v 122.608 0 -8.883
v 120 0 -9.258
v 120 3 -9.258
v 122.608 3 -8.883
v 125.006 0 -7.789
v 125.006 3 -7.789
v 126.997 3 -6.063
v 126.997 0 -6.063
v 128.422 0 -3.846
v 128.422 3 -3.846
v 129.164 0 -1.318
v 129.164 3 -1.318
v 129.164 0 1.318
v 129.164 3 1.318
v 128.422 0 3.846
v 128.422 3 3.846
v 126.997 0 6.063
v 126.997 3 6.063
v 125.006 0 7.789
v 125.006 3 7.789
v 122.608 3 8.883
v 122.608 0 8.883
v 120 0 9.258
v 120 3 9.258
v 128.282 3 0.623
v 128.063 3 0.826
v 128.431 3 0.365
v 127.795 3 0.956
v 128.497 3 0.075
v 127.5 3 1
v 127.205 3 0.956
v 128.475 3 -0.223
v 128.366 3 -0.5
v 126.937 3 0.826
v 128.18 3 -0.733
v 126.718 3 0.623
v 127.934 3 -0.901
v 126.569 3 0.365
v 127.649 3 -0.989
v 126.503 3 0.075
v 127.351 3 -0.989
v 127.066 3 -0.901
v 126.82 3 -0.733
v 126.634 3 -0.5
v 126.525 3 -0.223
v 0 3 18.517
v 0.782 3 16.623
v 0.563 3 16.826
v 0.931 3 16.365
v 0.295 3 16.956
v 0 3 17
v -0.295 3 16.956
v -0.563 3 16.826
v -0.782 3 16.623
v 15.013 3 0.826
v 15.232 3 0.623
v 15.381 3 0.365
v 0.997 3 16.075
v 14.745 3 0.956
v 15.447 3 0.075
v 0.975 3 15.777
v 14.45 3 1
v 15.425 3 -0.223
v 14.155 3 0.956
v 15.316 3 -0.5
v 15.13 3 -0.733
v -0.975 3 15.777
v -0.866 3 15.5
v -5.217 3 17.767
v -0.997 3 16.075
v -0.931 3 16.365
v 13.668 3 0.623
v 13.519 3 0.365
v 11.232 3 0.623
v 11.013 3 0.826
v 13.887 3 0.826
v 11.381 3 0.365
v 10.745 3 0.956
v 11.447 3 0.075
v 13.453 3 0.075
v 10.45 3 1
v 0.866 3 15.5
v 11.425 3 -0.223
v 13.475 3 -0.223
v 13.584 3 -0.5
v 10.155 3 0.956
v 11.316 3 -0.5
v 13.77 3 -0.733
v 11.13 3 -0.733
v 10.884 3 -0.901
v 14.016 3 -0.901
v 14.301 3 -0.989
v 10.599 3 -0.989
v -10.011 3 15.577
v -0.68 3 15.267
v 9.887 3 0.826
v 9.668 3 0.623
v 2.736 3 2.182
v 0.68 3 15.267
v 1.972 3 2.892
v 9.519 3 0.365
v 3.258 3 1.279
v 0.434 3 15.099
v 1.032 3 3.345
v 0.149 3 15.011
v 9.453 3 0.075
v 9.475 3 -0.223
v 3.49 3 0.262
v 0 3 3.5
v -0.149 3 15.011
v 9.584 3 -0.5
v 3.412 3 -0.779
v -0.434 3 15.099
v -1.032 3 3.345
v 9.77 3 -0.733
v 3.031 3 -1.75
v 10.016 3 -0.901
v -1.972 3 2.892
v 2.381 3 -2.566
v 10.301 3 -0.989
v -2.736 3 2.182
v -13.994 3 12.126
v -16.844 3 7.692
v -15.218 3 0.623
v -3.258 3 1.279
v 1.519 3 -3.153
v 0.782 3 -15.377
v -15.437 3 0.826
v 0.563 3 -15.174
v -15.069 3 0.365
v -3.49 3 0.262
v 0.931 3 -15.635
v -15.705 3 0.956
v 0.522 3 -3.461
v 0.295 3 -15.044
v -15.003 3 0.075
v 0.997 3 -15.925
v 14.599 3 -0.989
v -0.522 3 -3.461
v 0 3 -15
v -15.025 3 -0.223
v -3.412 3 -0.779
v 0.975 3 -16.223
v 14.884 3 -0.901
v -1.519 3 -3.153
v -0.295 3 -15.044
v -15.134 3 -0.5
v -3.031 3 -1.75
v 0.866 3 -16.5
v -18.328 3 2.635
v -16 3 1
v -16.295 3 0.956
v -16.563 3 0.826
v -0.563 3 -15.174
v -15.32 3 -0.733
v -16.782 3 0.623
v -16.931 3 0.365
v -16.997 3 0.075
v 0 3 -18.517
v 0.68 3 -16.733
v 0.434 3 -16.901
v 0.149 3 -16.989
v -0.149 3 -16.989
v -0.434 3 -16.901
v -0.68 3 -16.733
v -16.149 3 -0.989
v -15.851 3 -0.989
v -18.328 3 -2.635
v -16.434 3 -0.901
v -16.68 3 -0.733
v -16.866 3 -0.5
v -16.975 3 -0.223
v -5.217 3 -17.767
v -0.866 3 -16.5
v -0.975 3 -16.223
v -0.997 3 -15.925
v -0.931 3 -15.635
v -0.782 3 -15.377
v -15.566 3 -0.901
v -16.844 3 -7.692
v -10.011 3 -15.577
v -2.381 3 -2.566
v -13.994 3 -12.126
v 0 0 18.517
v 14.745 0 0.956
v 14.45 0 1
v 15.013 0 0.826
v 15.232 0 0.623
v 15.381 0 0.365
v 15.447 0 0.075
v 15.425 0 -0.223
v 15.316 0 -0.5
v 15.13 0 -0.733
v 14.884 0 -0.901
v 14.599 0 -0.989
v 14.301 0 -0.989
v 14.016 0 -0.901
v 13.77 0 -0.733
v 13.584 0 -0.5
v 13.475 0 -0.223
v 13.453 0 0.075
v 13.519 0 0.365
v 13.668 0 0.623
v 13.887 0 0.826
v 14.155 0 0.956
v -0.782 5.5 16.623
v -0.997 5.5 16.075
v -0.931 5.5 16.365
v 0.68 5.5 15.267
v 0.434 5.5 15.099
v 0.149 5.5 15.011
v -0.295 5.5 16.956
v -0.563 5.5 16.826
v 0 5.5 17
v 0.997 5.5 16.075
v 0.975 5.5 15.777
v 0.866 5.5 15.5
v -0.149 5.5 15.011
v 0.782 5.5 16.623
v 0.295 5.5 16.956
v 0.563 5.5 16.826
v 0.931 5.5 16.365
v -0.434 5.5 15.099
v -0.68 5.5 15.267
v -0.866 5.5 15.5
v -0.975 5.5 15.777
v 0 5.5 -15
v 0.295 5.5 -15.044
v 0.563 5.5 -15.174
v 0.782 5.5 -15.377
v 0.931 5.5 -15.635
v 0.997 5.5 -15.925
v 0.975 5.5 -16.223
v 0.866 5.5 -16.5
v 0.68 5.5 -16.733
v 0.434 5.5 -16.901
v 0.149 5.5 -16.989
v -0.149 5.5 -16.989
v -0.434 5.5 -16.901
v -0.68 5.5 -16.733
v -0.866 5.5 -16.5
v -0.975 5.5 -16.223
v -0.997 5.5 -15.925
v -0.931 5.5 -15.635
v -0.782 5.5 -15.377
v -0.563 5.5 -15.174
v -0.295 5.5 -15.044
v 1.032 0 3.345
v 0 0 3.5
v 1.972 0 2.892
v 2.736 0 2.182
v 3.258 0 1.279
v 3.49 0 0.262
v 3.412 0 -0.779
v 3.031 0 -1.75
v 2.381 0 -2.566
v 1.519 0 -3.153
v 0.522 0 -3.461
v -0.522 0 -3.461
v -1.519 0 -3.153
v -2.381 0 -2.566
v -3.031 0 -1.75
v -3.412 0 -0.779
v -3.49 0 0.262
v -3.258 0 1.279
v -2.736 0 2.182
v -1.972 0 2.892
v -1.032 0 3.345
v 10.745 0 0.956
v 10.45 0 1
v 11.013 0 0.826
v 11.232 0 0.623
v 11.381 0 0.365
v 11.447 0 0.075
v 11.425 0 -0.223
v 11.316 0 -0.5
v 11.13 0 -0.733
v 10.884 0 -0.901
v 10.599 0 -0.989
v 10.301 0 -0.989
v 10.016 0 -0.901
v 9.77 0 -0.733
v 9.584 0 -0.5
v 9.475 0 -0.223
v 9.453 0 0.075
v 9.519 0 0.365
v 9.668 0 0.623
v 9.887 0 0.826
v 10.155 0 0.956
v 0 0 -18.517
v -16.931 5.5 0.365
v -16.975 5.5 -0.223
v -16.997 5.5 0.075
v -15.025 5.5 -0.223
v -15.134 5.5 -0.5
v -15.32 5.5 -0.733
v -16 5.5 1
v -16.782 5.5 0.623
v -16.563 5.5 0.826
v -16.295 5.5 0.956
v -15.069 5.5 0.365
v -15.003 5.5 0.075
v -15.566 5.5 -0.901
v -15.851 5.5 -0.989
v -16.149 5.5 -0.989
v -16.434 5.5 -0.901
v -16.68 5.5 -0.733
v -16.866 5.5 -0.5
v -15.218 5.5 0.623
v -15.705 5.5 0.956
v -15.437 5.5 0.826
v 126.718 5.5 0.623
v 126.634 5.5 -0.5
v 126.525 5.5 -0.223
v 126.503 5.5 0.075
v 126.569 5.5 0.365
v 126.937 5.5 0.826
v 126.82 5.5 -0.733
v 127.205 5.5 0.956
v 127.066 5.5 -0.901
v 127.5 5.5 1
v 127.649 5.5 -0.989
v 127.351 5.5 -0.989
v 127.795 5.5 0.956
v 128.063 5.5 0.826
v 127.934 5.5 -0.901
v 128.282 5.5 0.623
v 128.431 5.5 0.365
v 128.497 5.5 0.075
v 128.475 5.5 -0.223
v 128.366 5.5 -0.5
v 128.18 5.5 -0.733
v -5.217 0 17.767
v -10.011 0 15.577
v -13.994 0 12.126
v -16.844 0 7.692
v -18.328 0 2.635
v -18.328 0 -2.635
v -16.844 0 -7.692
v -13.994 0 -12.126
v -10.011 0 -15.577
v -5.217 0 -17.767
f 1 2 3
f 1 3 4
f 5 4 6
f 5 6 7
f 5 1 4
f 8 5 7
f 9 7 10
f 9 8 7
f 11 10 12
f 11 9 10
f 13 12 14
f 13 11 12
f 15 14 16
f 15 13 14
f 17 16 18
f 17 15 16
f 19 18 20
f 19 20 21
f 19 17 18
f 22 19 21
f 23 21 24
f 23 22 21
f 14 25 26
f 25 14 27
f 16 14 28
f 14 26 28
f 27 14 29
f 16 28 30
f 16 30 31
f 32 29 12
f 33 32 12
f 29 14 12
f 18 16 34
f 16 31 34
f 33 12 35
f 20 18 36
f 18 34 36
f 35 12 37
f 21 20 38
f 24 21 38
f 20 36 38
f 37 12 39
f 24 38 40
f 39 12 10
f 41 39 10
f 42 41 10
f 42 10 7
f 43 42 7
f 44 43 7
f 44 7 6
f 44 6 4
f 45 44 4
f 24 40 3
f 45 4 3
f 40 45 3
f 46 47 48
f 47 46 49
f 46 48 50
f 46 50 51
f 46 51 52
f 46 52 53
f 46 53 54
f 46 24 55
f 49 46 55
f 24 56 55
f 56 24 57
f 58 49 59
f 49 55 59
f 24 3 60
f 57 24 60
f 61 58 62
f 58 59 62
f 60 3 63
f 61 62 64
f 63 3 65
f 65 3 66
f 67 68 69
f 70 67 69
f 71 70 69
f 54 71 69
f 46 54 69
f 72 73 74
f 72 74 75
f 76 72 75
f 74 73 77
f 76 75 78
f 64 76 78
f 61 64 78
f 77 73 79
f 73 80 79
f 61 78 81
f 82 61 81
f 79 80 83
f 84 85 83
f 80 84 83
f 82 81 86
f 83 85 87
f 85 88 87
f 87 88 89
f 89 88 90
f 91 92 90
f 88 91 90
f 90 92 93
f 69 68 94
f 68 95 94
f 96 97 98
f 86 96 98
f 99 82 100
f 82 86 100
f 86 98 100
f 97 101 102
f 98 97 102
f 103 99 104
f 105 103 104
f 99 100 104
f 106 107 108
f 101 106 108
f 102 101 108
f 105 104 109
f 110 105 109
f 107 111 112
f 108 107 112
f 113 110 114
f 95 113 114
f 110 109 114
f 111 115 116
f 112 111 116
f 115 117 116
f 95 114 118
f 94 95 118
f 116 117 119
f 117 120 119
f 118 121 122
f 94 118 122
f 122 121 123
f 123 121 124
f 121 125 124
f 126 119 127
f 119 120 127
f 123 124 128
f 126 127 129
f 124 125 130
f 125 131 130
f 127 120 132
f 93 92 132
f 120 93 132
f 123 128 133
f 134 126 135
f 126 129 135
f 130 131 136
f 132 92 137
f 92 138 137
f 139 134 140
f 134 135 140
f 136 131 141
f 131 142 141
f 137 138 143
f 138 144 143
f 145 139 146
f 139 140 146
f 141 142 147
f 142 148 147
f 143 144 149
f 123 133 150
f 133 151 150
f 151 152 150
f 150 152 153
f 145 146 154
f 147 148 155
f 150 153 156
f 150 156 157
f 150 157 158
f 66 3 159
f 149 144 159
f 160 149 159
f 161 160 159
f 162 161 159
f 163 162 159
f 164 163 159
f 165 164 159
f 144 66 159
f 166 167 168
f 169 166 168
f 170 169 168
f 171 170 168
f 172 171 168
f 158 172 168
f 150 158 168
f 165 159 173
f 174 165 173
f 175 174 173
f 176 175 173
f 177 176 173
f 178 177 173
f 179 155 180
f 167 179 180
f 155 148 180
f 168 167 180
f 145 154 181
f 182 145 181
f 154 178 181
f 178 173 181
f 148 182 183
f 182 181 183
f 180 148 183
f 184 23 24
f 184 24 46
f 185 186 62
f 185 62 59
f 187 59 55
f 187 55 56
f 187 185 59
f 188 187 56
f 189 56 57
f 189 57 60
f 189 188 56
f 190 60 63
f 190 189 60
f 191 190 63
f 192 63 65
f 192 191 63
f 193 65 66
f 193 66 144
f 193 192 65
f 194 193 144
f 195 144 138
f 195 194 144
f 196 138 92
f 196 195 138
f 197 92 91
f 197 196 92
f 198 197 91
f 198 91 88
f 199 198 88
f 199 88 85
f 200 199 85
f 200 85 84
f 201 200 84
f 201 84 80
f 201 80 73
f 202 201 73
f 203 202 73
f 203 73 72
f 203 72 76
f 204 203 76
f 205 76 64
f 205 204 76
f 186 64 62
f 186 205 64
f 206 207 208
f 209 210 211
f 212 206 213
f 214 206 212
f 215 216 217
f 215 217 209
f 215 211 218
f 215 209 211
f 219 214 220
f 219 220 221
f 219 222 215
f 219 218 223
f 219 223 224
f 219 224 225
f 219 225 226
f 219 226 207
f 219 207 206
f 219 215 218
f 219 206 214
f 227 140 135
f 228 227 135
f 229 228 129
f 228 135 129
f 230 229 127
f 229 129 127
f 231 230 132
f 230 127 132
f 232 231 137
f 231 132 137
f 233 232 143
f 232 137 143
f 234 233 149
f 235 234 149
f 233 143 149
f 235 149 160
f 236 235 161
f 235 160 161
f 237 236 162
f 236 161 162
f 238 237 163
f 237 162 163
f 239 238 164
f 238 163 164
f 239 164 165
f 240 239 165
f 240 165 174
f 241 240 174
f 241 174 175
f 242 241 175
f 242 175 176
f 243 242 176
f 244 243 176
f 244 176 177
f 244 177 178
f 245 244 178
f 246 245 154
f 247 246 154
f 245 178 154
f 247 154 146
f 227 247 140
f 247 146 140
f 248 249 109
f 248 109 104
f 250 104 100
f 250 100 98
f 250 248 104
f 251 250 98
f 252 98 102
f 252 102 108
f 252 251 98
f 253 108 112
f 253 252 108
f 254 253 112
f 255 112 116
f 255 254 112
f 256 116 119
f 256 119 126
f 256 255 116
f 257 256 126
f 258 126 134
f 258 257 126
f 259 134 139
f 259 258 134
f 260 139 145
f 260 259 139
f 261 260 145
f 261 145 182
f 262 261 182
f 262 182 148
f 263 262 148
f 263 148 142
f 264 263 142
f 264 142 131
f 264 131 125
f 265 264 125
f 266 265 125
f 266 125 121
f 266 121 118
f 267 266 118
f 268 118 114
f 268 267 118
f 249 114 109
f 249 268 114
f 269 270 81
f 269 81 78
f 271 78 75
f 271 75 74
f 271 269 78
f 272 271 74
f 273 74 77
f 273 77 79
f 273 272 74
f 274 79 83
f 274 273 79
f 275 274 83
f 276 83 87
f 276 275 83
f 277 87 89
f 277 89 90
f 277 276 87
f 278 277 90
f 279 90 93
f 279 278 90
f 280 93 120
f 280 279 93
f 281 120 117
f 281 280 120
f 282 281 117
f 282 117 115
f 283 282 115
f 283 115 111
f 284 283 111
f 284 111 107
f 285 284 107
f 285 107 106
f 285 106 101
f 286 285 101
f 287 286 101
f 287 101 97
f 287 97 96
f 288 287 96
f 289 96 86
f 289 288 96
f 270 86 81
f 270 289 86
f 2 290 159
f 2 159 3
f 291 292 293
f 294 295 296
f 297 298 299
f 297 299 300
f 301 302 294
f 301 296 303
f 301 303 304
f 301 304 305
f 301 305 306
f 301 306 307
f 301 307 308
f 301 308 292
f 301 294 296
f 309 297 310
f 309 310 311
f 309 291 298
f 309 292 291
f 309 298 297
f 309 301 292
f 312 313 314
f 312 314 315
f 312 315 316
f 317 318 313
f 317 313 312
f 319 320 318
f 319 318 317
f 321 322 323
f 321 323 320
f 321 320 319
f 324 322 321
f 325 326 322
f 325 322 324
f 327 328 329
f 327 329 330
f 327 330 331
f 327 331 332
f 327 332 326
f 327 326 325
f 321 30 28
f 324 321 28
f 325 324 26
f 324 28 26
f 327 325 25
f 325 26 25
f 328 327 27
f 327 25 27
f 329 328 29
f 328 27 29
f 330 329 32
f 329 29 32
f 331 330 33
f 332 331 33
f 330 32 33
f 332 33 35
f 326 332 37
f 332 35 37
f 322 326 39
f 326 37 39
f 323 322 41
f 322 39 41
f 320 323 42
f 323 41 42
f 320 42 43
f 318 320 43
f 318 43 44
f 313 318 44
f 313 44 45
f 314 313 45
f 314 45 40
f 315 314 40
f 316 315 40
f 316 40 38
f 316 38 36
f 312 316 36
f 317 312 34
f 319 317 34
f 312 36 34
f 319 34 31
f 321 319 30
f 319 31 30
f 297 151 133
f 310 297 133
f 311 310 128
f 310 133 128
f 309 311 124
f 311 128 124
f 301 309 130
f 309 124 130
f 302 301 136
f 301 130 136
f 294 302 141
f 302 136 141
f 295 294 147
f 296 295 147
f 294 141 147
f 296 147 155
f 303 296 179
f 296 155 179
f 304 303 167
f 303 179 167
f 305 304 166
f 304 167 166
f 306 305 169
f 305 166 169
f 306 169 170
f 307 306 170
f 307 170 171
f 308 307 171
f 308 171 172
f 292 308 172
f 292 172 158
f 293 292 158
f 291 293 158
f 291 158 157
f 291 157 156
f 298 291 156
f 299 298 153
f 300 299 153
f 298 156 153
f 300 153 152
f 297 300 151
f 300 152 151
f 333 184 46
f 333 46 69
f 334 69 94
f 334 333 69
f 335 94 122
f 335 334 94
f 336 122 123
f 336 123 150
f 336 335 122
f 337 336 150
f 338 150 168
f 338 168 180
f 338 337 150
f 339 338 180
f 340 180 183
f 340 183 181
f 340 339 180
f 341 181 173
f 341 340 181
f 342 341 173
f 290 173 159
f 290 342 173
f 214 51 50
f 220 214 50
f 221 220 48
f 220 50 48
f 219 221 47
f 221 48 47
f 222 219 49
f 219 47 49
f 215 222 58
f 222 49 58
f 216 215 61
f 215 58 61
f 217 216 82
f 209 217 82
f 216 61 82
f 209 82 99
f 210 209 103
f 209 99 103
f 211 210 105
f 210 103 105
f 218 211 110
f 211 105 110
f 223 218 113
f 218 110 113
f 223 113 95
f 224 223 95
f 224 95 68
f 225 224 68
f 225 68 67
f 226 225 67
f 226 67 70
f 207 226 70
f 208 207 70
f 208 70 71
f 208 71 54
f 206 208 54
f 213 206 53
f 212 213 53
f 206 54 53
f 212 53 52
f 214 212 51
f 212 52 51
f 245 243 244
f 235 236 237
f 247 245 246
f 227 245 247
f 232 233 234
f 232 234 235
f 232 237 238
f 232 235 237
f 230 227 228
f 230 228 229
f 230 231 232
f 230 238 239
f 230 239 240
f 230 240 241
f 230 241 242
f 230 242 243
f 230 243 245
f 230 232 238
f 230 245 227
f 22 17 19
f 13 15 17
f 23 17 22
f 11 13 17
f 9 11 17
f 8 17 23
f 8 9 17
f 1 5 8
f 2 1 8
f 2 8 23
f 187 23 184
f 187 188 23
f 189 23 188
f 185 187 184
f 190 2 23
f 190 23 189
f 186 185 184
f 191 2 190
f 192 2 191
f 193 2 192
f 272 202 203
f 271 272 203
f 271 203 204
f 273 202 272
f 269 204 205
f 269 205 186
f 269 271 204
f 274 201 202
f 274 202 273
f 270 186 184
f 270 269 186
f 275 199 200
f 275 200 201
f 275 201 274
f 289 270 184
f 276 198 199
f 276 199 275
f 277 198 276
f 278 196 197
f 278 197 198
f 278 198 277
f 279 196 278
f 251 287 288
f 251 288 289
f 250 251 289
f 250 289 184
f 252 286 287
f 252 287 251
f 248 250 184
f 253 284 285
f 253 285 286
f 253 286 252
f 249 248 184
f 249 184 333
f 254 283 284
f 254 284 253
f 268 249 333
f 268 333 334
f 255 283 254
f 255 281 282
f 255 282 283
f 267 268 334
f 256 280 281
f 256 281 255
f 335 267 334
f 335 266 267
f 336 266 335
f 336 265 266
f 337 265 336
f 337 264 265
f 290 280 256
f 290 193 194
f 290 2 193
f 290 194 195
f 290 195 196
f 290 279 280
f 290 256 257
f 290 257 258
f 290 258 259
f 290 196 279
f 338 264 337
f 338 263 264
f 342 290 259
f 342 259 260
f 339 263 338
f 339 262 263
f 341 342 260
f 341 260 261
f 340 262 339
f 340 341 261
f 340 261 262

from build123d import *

# Parameters (mm, degrees)
SKETCH1_R           = 3.5
SKETCH1_R_2         = 1
BOSS_EXTRUDE1_DEPTH = 3
SKETCH2_R           = 1
BOSS_EXTRUDE2_DEPTH = 2.5


with BuildPart() as part:
    # Sketch1 → Boss-Extrude1 (new body)
    with BuildSketch(Plane(origin=(0, 0, 0), x_dir=(1, 0, 0), z_dir=(0, 1, 0))):
        with BuildLine():
            Line((0, 18.516950365), (120, 9.258475183))
            ThreePointArc((120, 9.258475183), (129.258475183, 0), (120, -9.258475183))
            Line((120, -9.258475183), (0, -18.516950365))
            ThreePointArc((0, -18.516950365), (-18.516950365, 0), (0, 18.516950365))
        make_face()
        with Locations(Location((0, 0, 0), (0, 0, 270))):
            Circle(SKETCH1_R, mode=Mode.SUBTRACT)
        with Locations(Location((14.45, 0, 0), (0, 0, 270))):
            Circle(SKETCH1_R_2, mode=Mode.SUBTRACT)
        with Locations(Location((10.45, 0, 0), (0, 0, 270))):
            Circle(SKETCH1_R_2, mode=Mode.SUBTRACT)
    extrude(amount=BOSS_EXTRUDE1_DEPTH)

    # Sketch2 → Boss-Extrude2 (add)
    with BuildSketch(Plane(origin=(0, 3, 0), x_dir=(1, 0, 0), z_dir=(0, 1, 0))):
        with Locations(Location((-16, 0, 0), (0, 0, 270))):
            Circle(SKETCH2_R)
        with Locations(Location((0, 16, 0), (0, 0, 270))):
            Circle(SKETCH2_R)
        with Locations(Location((0, -16, 0), (0, 0, 270))):
            Circle(SKETCH2_R)
        with Locations(Location((127.5, 0, 0), (0, 0, 270))):
            Circle(SKETCH2_R)
    extrude(amount=BOSS_EXTRUDE2_DEPTH)


solid = part.part
